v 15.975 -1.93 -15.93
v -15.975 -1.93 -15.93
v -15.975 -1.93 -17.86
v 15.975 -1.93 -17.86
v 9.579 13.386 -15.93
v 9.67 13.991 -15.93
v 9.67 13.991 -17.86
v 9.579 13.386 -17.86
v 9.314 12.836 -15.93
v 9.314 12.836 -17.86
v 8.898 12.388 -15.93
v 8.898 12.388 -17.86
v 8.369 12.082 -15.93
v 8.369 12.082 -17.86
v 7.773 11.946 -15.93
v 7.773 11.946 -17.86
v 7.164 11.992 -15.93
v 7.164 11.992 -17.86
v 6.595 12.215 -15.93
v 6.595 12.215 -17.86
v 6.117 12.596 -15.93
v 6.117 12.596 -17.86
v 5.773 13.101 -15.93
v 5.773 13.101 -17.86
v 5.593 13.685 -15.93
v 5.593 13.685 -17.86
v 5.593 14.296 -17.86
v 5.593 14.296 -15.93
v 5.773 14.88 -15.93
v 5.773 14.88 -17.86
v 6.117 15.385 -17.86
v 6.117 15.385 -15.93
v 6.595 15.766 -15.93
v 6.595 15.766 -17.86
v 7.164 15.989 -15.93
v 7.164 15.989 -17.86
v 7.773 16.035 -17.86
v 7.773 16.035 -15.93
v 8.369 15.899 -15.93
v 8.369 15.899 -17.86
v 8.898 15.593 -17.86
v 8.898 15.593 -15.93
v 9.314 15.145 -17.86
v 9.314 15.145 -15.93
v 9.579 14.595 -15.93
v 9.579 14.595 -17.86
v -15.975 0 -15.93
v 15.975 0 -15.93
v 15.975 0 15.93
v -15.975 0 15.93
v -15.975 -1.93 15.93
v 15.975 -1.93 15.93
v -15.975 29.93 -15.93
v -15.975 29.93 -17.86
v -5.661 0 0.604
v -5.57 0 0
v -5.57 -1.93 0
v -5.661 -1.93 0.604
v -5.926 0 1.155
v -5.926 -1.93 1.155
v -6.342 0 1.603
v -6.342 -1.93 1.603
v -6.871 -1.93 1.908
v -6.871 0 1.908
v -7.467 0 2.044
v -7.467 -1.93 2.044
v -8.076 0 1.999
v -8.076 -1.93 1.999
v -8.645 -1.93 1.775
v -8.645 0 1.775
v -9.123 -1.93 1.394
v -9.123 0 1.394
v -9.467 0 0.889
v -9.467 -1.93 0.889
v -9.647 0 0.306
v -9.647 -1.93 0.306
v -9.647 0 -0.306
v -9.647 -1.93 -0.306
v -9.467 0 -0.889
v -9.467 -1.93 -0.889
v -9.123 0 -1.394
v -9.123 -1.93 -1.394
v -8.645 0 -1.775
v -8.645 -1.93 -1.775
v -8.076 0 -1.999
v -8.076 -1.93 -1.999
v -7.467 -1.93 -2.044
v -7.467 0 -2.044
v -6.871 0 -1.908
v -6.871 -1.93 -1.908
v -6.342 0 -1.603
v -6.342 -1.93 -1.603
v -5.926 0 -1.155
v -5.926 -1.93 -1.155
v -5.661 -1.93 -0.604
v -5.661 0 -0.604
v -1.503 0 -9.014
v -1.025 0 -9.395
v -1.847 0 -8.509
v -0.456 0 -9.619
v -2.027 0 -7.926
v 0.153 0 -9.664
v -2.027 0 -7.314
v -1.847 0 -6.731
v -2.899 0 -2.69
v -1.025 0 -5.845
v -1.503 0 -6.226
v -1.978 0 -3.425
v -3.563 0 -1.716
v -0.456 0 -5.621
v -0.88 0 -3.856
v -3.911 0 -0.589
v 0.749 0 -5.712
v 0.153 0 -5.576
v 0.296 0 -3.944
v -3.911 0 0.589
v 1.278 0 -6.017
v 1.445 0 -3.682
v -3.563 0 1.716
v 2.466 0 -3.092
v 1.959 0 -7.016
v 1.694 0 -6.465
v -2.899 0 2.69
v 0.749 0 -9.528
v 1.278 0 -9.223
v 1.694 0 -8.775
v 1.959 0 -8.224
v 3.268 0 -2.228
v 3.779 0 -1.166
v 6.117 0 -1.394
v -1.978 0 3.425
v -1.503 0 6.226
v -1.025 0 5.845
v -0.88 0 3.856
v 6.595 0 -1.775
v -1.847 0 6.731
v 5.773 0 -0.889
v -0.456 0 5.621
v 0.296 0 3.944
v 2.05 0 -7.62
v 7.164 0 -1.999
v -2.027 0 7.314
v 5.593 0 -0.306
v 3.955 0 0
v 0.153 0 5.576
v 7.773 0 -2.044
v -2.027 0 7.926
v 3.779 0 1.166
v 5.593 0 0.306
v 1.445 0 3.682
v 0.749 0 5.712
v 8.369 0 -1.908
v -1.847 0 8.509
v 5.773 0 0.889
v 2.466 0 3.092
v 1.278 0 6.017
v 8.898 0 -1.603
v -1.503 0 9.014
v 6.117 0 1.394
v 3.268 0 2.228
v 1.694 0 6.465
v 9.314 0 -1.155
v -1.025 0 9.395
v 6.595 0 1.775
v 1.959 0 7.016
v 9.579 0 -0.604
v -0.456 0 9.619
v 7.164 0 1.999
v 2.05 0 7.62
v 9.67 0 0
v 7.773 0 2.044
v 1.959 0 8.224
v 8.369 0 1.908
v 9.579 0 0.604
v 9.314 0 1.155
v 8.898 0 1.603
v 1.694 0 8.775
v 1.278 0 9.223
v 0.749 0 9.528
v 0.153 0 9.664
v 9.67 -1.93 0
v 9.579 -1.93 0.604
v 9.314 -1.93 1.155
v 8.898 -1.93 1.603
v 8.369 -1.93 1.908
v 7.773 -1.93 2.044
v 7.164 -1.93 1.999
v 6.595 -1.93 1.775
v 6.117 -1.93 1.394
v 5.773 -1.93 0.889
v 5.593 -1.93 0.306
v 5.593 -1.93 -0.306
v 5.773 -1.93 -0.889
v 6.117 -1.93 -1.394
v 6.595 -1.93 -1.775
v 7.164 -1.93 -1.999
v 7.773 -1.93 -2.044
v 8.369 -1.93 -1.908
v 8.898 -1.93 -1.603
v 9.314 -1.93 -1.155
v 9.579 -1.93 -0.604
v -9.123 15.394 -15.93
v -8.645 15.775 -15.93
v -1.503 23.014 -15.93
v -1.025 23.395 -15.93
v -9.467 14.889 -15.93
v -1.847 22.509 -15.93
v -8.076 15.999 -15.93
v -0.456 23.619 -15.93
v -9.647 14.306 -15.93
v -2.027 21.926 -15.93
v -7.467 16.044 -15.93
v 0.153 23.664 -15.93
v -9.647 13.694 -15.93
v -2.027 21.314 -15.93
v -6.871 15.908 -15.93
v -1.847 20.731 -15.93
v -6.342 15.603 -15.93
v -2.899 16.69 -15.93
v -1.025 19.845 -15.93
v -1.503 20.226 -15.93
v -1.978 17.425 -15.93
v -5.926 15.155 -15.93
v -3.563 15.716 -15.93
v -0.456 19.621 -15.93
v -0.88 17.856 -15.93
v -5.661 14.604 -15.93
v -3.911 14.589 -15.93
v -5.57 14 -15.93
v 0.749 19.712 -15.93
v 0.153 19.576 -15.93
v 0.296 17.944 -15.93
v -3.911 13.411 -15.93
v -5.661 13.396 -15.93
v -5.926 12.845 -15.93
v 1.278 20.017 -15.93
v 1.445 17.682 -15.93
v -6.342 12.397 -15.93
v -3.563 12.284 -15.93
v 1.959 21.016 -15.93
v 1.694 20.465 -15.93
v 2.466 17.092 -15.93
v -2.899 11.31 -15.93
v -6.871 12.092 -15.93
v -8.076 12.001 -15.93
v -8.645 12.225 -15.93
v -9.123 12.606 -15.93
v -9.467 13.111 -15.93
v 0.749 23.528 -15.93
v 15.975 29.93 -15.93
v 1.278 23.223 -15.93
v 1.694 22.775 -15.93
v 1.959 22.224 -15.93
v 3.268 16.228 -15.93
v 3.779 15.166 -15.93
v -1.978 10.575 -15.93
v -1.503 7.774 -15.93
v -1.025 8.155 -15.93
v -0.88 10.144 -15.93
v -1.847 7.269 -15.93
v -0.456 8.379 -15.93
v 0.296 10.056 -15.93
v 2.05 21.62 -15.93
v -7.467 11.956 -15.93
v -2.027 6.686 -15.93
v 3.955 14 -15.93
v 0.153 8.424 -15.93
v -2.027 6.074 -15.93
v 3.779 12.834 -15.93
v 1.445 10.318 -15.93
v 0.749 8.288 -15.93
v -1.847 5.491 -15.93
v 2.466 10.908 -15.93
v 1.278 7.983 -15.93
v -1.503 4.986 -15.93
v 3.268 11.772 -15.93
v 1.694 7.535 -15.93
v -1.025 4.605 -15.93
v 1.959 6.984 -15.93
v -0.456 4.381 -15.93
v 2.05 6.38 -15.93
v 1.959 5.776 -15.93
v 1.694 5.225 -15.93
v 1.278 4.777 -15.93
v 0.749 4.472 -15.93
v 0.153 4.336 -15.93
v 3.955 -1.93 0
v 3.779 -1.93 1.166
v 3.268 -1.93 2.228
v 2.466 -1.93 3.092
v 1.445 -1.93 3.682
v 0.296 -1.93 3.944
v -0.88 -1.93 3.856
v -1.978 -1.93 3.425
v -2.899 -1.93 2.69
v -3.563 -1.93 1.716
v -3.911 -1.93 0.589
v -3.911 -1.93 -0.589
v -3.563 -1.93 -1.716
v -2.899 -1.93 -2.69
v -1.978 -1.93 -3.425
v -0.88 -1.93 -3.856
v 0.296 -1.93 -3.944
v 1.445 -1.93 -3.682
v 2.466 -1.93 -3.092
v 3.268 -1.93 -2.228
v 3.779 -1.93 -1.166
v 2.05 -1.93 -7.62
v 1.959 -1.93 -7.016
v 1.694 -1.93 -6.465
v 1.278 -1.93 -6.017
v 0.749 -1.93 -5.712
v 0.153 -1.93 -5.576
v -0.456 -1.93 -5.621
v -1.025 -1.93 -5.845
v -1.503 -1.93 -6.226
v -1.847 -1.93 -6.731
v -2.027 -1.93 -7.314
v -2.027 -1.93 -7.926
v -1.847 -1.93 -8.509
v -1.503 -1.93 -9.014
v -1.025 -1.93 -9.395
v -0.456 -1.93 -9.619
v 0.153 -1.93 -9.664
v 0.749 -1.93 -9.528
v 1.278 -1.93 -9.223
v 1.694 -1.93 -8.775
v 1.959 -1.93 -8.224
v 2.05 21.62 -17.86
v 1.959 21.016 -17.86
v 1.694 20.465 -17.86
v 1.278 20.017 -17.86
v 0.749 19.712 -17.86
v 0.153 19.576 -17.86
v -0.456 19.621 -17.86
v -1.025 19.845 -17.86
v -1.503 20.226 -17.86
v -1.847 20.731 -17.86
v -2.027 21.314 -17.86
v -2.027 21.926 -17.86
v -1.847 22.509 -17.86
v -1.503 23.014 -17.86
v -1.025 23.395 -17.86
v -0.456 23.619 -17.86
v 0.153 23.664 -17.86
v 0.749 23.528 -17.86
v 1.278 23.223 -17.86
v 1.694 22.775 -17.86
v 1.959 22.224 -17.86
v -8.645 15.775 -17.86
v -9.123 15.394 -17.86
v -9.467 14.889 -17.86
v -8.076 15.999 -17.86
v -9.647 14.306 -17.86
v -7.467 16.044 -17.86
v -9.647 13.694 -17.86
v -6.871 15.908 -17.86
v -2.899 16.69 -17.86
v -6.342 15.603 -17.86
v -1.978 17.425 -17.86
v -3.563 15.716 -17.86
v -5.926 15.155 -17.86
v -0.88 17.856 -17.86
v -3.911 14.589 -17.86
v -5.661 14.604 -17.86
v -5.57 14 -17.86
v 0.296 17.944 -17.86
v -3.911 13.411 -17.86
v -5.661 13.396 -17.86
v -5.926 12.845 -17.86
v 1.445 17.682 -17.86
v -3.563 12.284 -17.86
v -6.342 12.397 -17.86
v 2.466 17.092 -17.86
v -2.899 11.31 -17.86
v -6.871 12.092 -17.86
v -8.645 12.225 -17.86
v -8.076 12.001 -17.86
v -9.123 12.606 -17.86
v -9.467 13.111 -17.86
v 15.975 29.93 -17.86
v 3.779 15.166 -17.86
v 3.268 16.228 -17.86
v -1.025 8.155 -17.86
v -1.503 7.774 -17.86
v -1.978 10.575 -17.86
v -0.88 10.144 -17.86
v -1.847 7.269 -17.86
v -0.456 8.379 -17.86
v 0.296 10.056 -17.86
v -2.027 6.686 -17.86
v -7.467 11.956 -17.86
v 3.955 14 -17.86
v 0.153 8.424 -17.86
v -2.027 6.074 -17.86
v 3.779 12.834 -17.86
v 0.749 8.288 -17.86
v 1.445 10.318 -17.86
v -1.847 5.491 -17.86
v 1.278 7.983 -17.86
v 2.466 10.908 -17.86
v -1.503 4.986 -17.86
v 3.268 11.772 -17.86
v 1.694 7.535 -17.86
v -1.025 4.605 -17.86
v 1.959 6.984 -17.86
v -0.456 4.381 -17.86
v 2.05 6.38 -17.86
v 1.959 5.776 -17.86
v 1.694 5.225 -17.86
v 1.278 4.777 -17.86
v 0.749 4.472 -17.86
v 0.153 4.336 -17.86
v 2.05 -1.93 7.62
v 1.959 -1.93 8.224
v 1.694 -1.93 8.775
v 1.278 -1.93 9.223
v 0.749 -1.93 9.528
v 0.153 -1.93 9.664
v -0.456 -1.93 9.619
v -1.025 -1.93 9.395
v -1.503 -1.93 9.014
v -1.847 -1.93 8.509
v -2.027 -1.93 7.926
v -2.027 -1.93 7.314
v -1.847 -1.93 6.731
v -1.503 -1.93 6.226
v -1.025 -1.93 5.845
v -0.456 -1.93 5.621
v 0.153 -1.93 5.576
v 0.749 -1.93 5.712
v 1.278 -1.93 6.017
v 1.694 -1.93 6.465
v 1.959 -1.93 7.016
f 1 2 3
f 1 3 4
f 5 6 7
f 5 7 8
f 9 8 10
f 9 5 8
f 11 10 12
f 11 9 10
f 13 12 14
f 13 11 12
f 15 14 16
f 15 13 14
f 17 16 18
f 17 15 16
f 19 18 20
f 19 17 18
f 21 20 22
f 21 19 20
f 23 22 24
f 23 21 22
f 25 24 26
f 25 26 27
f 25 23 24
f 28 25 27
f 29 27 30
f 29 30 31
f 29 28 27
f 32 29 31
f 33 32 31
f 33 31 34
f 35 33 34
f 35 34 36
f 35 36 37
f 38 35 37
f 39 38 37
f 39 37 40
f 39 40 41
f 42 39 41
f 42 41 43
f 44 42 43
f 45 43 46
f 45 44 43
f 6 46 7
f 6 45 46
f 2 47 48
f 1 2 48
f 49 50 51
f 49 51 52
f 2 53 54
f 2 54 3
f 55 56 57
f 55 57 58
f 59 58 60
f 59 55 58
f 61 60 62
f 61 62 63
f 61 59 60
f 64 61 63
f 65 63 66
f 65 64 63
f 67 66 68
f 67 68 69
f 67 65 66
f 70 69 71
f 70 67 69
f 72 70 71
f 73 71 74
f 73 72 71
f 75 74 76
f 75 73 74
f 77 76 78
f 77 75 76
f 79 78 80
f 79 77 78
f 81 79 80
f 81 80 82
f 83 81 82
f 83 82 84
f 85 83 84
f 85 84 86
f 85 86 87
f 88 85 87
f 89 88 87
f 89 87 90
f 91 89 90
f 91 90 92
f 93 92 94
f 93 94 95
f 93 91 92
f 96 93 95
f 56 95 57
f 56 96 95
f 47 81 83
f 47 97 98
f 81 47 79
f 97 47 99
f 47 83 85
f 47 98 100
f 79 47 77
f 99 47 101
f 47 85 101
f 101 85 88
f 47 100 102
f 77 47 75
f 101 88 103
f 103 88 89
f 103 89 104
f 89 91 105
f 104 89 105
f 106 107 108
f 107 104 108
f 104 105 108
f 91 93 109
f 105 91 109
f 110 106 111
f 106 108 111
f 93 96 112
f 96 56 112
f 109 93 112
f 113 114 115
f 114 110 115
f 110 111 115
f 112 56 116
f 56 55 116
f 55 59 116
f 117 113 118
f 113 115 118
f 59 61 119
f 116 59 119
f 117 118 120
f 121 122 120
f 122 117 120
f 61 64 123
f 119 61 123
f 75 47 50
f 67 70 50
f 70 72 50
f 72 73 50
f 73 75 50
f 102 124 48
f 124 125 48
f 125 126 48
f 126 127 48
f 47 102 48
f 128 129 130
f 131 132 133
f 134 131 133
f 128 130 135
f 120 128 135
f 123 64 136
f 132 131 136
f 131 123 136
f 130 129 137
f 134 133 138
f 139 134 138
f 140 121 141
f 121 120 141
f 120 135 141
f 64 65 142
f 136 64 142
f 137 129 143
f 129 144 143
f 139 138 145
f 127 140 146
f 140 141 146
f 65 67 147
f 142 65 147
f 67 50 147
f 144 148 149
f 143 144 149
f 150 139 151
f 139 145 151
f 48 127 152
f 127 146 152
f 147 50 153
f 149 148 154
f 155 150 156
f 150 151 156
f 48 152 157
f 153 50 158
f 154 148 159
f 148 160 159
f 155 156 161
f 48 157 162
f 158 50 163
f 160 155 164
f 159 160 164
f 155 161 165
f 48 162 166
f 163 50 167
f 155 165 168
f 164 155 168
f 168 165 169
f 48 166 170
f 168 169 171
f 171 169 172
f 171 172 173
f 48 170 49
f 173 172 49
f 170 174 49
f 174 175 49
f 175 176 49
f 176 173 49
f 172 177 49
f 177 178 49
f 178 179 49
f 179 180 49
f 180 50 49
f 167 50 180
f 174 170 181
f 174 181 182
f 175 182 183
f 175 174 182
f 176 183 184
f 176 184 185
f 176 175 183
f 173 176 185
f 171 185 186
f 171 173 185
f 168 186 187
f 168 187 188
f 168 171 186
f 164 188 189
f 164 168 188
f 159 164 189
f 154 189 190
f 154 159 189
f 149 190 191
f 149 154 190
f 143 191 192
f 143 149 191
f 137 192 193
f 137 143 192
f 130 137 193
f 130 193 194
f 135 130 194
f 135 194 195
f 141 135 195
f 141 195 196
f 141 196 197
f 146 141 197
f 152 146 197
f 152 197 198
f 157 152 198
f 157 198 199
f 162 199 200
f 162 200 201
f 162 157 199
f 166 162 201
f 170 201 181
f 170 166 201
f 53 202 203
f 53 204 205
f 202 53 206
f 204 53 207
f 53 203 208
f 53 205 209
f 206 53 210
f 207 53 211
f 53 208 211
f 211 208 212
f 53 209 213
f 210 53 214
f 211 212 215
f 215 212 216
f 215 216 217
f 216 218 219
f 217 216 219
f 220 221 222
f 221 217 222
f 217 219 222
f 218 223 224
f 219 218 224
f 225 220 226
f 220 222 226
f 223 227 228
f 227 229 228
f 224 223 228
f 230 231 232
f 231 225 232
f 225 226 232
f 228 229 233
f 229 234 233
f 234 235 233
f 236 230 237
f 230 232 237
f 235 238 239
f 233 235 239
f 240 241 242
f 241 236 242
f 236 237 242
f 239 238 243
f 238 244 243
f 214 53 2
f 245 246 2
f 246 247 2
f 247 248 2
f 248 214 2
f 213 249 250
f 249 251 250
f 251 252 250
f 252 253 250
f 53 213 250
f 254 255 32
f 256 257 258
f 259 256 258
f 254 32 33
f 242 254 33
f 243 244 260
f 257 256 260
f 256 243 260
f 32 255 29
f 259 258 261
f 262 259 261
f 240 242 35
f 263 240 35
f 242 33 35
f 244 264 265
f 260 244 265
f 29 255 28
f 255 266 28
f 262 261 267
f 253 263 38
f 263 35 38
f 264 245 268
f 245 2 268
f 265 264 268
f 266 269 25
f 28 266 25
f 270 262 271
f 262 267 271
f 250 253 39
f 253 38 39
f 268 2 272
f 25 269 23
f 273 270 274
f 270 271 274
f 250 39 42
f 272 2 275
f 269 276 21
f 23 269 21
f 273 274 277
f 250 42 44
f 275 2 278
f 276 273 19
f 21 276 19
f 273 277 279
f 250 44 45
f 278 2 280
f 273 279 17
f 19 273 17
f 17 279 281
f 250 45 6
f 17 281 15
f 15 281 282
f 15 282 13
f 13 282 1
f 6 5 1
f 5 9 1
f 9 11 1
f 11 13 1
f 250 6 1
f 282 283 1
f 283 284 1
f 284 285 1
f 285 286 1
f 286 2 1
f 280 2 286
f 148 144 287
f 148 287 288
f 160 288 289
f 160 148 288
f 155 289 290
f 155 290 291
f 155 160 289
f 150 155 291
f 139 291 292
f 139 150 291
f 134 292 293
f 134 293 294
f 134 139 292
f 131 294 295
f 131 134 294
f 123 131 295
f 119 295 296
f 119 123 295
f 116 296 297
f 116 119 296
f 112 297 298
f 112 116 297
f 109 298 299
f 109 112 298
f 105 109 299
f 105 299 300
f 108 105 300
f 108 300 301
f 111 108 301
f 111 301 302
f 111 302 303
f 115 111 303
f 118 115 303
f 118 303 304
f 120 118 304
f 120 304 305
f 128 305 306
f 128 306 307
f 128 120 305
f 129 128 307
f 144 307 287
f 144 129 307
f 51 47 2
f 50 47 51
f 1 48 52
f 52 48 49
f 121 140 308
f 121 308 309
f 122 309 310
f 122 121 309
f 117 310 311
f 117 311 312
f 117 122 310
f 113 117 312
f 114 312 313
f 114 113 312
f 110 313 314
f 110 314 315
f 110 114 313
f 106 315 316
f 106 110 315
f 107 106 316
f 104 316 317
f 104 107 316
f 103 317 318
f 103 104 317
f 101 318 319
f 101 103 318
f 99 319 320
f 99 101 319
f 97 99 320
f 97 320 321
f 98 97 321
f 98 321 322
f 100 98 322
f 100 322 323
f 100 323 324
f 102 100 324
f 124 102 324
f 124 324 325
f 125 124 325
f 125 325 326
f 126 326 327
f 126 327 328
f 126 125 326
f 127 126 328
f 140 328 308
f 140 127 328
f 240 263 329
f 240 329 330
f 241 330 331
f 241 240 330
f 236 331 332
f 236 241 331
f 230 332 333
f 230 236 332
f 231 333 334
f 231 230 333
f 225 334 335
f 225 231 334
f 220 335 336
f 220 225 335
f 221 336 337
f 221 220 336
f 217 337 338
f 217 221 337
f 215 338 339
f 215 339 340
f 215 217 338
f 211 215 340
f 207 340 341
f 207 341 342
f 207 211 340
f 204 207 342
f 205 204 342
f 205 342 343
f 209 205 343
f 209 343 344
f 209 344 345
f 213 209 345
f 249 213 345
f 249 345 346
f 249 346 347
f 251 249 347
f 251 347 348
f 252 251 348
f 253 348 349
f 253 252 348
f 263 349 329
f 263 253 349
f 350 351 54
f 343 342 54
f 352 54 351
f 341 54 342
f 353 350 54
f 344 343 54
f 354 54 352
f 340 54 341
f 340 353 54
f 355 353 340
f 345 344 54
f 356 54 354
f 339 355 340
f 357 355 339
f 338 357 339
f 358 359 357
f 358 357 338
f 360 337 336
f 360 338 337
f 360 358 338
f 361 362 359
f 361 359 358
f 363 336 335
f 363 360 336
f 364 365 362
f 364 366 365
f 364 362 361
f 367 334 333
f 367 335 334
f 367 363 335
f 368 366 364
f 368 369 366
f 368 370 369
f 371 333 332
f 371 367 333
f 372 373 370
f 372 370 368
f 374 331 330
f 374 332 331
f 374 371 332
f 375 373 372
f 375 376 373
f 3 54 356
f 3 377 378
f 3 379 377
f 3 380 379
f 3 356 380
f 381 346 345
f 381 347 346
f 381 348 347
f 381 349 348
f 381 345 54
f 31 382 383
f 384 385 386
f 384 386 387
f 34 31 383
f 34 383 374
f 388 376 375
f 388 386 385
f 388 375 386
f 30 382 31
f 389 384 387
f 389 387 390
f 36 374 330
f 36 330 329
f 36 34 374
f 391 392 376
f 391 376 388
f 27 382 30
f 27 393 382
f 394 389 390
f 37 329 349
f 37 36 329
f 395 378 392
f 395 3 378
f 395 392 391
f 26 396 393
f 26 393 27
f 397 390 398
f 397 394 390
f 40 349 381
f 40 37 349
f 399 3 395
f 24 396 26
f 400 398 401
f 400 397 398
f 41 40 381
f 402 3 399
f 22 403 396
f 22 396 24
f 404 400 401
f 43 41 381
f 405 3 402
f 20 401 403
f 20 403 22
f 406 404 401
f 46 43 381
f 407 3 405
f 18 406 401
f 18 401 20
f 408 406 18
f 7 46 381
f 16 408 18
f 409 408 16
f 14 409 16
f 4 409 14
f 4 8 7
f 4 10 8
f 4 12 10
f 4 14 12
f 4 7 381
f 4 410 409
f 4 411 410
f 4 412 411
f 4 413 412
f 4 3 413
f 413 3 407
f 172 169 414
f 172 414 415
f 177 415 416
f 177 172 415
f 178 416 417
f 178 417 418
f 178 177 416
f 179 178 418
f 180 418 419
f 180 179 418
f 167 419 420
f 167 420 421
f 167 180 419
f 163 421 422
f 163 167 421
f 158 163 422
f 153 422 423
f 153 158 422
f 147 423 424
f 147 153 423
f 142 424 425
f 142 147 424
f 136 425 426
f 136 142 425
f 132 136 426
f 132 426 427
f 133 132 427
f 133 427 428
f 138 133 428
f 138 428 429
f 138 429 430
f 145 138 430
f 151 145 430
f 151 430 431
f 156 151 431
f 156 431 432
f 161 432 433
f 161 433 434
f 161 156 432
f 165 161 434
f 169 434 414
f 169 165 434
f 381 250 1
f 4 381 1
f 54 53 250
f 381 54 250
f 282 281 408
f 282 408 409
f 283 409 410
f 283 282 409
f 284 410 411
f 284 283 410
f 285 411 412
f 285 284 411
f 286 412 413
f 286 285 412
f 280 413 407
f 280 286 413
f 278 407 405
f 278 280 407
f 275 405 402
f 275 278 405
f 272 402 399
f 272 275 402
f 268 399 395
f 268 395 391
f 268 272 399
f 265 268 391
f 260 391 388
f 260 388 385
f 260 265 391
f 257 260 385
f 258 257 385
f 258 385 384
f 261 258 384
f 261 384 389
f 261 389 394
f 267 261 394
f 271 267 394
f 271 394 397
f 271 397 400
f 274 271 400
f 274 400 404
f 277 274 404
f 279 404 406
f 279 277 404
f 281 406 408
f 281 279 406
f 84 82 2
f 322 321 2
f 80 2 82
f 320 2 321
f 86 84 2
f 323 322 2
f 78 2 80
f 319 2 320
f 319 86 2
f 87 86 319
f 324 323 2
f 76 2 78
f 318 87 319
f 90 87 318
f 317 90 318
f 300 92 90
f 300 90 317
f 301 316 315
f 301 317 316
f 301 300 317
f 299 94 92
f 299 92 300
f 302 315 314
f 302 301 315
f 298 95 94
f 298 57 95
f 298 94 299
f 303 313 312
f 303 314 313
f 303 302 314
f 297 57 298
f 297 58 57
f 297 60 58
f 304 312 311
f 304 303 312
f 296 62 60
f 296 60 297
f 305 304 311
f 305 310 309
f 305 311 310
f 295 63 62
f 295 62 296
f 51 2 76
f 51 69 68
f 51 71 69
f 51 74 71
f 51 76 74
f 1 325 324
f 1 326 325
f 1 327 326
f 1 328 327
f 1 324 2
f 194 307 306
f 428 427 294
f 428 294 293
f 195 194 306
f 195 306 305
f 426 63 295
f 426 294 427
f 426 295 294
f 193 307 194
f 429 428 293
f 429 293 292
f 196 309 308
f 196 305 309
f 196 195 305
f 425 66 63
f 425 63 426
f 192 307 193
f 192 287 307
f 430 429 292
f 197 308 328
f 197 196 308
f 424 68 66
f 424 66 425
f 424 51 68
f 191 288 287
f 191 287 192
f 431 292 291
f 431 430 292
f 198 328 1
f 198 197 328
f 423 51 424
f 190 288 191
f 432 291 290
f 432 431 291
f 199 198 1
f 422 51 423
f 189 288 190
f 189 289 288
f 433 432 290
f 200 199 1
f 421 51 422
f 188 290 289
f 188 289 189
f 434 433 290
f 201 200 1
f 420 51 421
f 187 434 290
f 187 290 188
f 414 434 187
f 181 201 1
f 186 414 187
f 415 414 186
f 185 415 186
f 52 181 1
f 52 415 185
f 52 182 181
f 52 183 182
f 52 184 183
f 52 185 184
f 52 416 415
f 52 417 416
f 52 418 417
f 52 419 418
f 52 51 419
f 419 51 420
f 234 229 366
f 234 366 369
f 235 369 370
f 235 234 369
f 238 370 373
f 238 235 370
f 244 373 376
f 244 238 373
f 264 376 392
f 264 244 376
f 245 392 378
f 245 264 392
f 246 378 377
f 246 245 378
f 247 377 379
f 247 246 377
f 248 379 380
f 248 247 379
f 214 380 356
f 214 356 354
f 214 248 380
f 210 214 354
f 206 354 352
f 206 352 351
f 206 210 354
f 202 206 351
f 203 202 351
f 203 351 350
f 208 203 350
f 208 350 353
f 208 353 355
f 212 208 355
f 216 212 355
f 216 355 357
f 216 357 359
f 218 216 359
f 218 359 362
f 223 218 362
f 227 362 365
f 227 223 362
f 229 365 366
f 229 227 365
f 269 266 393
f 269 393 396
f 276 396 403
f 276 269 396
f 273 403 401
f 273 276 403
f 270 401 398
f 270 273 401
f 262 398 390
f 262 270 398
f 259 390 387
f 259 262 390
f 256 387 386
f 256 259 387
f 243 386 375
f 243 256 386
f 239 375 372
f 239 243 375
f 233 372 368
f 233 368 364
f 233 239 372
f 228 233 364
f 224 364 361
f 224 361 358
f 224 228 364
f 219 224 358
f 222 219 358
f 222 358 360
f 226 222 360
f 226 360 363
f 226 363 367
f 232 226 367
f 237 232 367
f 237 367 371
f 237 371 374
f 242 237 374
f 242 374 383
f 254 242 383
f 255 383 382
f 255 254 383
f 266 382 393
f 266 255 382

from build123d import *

# Parameters (mm, degrees)
F0_W     = 31.95
F0_H     = 31.86
F0_R     = 2.05
F0_R_2   = 3.955
F1_DEPTH = 1.93
F2_W     = 31.95
F2_H     = 31.86
F2_R     = 2.05
F2_R_2   = 3.955
F3_DEPTH = 1.9304


with BuildPart() as f1:
    # F0 (on Front) → F1 (new body)
    with BuildSketch(Plane.XZ):
        Rectangle(F0_W, F0_H)
        with Locations((0, -7.62)):
            Circle(F0_R, mode=Mode.SUBTRACT)
        with Locations((-7.62, 0)):
            Circle(F0_R, mode=Mode.SUBTRACT)
        Circle(F0_R_2, mode=Mode.SUBTRACT)
        with Locations((7.62, 0)):
            Circle(F0_R, mode=Mode.SUBTRACT)
        with Locations((0, 7.62)):
            Circle(F0_R, mode=Mode.SUBTRACT)
    extrude(amount=F1_DEPTH)


with BuildPart() as f3:
    # F2 (on face) → F3 (new body)
    with BuildSketch(Plane(origin=(0, 0, -15.93), x_dir=(1, 0, 0), z_dir=(0, 0, -1))):
        with Locations((0, -14)):
            Rectangle(F2_W, F2_H)
        with Locations((0, -21.62)):
            Circle(F2_R, mode=Mode.SUBTRACT)
        with Locations((-7.62, -14)):
            Circle(F2_R, mode=Mode.SUBTRACT)
        with Locations((0, -14)):
            Circle(F2_R_2, mode=Mode.SUBTRACT)
        with Locations((7.619994, -13.990517)):
            Circle(F2_R, mode=Mode.SUBTRACT)
        with Locations((0, -6.38)):
            Circle(F2_R, mode=Mode.SUBTRACT)
    extrude(amount=F3_DEPTH)


solid = Compound([f1.part, f3.part])
